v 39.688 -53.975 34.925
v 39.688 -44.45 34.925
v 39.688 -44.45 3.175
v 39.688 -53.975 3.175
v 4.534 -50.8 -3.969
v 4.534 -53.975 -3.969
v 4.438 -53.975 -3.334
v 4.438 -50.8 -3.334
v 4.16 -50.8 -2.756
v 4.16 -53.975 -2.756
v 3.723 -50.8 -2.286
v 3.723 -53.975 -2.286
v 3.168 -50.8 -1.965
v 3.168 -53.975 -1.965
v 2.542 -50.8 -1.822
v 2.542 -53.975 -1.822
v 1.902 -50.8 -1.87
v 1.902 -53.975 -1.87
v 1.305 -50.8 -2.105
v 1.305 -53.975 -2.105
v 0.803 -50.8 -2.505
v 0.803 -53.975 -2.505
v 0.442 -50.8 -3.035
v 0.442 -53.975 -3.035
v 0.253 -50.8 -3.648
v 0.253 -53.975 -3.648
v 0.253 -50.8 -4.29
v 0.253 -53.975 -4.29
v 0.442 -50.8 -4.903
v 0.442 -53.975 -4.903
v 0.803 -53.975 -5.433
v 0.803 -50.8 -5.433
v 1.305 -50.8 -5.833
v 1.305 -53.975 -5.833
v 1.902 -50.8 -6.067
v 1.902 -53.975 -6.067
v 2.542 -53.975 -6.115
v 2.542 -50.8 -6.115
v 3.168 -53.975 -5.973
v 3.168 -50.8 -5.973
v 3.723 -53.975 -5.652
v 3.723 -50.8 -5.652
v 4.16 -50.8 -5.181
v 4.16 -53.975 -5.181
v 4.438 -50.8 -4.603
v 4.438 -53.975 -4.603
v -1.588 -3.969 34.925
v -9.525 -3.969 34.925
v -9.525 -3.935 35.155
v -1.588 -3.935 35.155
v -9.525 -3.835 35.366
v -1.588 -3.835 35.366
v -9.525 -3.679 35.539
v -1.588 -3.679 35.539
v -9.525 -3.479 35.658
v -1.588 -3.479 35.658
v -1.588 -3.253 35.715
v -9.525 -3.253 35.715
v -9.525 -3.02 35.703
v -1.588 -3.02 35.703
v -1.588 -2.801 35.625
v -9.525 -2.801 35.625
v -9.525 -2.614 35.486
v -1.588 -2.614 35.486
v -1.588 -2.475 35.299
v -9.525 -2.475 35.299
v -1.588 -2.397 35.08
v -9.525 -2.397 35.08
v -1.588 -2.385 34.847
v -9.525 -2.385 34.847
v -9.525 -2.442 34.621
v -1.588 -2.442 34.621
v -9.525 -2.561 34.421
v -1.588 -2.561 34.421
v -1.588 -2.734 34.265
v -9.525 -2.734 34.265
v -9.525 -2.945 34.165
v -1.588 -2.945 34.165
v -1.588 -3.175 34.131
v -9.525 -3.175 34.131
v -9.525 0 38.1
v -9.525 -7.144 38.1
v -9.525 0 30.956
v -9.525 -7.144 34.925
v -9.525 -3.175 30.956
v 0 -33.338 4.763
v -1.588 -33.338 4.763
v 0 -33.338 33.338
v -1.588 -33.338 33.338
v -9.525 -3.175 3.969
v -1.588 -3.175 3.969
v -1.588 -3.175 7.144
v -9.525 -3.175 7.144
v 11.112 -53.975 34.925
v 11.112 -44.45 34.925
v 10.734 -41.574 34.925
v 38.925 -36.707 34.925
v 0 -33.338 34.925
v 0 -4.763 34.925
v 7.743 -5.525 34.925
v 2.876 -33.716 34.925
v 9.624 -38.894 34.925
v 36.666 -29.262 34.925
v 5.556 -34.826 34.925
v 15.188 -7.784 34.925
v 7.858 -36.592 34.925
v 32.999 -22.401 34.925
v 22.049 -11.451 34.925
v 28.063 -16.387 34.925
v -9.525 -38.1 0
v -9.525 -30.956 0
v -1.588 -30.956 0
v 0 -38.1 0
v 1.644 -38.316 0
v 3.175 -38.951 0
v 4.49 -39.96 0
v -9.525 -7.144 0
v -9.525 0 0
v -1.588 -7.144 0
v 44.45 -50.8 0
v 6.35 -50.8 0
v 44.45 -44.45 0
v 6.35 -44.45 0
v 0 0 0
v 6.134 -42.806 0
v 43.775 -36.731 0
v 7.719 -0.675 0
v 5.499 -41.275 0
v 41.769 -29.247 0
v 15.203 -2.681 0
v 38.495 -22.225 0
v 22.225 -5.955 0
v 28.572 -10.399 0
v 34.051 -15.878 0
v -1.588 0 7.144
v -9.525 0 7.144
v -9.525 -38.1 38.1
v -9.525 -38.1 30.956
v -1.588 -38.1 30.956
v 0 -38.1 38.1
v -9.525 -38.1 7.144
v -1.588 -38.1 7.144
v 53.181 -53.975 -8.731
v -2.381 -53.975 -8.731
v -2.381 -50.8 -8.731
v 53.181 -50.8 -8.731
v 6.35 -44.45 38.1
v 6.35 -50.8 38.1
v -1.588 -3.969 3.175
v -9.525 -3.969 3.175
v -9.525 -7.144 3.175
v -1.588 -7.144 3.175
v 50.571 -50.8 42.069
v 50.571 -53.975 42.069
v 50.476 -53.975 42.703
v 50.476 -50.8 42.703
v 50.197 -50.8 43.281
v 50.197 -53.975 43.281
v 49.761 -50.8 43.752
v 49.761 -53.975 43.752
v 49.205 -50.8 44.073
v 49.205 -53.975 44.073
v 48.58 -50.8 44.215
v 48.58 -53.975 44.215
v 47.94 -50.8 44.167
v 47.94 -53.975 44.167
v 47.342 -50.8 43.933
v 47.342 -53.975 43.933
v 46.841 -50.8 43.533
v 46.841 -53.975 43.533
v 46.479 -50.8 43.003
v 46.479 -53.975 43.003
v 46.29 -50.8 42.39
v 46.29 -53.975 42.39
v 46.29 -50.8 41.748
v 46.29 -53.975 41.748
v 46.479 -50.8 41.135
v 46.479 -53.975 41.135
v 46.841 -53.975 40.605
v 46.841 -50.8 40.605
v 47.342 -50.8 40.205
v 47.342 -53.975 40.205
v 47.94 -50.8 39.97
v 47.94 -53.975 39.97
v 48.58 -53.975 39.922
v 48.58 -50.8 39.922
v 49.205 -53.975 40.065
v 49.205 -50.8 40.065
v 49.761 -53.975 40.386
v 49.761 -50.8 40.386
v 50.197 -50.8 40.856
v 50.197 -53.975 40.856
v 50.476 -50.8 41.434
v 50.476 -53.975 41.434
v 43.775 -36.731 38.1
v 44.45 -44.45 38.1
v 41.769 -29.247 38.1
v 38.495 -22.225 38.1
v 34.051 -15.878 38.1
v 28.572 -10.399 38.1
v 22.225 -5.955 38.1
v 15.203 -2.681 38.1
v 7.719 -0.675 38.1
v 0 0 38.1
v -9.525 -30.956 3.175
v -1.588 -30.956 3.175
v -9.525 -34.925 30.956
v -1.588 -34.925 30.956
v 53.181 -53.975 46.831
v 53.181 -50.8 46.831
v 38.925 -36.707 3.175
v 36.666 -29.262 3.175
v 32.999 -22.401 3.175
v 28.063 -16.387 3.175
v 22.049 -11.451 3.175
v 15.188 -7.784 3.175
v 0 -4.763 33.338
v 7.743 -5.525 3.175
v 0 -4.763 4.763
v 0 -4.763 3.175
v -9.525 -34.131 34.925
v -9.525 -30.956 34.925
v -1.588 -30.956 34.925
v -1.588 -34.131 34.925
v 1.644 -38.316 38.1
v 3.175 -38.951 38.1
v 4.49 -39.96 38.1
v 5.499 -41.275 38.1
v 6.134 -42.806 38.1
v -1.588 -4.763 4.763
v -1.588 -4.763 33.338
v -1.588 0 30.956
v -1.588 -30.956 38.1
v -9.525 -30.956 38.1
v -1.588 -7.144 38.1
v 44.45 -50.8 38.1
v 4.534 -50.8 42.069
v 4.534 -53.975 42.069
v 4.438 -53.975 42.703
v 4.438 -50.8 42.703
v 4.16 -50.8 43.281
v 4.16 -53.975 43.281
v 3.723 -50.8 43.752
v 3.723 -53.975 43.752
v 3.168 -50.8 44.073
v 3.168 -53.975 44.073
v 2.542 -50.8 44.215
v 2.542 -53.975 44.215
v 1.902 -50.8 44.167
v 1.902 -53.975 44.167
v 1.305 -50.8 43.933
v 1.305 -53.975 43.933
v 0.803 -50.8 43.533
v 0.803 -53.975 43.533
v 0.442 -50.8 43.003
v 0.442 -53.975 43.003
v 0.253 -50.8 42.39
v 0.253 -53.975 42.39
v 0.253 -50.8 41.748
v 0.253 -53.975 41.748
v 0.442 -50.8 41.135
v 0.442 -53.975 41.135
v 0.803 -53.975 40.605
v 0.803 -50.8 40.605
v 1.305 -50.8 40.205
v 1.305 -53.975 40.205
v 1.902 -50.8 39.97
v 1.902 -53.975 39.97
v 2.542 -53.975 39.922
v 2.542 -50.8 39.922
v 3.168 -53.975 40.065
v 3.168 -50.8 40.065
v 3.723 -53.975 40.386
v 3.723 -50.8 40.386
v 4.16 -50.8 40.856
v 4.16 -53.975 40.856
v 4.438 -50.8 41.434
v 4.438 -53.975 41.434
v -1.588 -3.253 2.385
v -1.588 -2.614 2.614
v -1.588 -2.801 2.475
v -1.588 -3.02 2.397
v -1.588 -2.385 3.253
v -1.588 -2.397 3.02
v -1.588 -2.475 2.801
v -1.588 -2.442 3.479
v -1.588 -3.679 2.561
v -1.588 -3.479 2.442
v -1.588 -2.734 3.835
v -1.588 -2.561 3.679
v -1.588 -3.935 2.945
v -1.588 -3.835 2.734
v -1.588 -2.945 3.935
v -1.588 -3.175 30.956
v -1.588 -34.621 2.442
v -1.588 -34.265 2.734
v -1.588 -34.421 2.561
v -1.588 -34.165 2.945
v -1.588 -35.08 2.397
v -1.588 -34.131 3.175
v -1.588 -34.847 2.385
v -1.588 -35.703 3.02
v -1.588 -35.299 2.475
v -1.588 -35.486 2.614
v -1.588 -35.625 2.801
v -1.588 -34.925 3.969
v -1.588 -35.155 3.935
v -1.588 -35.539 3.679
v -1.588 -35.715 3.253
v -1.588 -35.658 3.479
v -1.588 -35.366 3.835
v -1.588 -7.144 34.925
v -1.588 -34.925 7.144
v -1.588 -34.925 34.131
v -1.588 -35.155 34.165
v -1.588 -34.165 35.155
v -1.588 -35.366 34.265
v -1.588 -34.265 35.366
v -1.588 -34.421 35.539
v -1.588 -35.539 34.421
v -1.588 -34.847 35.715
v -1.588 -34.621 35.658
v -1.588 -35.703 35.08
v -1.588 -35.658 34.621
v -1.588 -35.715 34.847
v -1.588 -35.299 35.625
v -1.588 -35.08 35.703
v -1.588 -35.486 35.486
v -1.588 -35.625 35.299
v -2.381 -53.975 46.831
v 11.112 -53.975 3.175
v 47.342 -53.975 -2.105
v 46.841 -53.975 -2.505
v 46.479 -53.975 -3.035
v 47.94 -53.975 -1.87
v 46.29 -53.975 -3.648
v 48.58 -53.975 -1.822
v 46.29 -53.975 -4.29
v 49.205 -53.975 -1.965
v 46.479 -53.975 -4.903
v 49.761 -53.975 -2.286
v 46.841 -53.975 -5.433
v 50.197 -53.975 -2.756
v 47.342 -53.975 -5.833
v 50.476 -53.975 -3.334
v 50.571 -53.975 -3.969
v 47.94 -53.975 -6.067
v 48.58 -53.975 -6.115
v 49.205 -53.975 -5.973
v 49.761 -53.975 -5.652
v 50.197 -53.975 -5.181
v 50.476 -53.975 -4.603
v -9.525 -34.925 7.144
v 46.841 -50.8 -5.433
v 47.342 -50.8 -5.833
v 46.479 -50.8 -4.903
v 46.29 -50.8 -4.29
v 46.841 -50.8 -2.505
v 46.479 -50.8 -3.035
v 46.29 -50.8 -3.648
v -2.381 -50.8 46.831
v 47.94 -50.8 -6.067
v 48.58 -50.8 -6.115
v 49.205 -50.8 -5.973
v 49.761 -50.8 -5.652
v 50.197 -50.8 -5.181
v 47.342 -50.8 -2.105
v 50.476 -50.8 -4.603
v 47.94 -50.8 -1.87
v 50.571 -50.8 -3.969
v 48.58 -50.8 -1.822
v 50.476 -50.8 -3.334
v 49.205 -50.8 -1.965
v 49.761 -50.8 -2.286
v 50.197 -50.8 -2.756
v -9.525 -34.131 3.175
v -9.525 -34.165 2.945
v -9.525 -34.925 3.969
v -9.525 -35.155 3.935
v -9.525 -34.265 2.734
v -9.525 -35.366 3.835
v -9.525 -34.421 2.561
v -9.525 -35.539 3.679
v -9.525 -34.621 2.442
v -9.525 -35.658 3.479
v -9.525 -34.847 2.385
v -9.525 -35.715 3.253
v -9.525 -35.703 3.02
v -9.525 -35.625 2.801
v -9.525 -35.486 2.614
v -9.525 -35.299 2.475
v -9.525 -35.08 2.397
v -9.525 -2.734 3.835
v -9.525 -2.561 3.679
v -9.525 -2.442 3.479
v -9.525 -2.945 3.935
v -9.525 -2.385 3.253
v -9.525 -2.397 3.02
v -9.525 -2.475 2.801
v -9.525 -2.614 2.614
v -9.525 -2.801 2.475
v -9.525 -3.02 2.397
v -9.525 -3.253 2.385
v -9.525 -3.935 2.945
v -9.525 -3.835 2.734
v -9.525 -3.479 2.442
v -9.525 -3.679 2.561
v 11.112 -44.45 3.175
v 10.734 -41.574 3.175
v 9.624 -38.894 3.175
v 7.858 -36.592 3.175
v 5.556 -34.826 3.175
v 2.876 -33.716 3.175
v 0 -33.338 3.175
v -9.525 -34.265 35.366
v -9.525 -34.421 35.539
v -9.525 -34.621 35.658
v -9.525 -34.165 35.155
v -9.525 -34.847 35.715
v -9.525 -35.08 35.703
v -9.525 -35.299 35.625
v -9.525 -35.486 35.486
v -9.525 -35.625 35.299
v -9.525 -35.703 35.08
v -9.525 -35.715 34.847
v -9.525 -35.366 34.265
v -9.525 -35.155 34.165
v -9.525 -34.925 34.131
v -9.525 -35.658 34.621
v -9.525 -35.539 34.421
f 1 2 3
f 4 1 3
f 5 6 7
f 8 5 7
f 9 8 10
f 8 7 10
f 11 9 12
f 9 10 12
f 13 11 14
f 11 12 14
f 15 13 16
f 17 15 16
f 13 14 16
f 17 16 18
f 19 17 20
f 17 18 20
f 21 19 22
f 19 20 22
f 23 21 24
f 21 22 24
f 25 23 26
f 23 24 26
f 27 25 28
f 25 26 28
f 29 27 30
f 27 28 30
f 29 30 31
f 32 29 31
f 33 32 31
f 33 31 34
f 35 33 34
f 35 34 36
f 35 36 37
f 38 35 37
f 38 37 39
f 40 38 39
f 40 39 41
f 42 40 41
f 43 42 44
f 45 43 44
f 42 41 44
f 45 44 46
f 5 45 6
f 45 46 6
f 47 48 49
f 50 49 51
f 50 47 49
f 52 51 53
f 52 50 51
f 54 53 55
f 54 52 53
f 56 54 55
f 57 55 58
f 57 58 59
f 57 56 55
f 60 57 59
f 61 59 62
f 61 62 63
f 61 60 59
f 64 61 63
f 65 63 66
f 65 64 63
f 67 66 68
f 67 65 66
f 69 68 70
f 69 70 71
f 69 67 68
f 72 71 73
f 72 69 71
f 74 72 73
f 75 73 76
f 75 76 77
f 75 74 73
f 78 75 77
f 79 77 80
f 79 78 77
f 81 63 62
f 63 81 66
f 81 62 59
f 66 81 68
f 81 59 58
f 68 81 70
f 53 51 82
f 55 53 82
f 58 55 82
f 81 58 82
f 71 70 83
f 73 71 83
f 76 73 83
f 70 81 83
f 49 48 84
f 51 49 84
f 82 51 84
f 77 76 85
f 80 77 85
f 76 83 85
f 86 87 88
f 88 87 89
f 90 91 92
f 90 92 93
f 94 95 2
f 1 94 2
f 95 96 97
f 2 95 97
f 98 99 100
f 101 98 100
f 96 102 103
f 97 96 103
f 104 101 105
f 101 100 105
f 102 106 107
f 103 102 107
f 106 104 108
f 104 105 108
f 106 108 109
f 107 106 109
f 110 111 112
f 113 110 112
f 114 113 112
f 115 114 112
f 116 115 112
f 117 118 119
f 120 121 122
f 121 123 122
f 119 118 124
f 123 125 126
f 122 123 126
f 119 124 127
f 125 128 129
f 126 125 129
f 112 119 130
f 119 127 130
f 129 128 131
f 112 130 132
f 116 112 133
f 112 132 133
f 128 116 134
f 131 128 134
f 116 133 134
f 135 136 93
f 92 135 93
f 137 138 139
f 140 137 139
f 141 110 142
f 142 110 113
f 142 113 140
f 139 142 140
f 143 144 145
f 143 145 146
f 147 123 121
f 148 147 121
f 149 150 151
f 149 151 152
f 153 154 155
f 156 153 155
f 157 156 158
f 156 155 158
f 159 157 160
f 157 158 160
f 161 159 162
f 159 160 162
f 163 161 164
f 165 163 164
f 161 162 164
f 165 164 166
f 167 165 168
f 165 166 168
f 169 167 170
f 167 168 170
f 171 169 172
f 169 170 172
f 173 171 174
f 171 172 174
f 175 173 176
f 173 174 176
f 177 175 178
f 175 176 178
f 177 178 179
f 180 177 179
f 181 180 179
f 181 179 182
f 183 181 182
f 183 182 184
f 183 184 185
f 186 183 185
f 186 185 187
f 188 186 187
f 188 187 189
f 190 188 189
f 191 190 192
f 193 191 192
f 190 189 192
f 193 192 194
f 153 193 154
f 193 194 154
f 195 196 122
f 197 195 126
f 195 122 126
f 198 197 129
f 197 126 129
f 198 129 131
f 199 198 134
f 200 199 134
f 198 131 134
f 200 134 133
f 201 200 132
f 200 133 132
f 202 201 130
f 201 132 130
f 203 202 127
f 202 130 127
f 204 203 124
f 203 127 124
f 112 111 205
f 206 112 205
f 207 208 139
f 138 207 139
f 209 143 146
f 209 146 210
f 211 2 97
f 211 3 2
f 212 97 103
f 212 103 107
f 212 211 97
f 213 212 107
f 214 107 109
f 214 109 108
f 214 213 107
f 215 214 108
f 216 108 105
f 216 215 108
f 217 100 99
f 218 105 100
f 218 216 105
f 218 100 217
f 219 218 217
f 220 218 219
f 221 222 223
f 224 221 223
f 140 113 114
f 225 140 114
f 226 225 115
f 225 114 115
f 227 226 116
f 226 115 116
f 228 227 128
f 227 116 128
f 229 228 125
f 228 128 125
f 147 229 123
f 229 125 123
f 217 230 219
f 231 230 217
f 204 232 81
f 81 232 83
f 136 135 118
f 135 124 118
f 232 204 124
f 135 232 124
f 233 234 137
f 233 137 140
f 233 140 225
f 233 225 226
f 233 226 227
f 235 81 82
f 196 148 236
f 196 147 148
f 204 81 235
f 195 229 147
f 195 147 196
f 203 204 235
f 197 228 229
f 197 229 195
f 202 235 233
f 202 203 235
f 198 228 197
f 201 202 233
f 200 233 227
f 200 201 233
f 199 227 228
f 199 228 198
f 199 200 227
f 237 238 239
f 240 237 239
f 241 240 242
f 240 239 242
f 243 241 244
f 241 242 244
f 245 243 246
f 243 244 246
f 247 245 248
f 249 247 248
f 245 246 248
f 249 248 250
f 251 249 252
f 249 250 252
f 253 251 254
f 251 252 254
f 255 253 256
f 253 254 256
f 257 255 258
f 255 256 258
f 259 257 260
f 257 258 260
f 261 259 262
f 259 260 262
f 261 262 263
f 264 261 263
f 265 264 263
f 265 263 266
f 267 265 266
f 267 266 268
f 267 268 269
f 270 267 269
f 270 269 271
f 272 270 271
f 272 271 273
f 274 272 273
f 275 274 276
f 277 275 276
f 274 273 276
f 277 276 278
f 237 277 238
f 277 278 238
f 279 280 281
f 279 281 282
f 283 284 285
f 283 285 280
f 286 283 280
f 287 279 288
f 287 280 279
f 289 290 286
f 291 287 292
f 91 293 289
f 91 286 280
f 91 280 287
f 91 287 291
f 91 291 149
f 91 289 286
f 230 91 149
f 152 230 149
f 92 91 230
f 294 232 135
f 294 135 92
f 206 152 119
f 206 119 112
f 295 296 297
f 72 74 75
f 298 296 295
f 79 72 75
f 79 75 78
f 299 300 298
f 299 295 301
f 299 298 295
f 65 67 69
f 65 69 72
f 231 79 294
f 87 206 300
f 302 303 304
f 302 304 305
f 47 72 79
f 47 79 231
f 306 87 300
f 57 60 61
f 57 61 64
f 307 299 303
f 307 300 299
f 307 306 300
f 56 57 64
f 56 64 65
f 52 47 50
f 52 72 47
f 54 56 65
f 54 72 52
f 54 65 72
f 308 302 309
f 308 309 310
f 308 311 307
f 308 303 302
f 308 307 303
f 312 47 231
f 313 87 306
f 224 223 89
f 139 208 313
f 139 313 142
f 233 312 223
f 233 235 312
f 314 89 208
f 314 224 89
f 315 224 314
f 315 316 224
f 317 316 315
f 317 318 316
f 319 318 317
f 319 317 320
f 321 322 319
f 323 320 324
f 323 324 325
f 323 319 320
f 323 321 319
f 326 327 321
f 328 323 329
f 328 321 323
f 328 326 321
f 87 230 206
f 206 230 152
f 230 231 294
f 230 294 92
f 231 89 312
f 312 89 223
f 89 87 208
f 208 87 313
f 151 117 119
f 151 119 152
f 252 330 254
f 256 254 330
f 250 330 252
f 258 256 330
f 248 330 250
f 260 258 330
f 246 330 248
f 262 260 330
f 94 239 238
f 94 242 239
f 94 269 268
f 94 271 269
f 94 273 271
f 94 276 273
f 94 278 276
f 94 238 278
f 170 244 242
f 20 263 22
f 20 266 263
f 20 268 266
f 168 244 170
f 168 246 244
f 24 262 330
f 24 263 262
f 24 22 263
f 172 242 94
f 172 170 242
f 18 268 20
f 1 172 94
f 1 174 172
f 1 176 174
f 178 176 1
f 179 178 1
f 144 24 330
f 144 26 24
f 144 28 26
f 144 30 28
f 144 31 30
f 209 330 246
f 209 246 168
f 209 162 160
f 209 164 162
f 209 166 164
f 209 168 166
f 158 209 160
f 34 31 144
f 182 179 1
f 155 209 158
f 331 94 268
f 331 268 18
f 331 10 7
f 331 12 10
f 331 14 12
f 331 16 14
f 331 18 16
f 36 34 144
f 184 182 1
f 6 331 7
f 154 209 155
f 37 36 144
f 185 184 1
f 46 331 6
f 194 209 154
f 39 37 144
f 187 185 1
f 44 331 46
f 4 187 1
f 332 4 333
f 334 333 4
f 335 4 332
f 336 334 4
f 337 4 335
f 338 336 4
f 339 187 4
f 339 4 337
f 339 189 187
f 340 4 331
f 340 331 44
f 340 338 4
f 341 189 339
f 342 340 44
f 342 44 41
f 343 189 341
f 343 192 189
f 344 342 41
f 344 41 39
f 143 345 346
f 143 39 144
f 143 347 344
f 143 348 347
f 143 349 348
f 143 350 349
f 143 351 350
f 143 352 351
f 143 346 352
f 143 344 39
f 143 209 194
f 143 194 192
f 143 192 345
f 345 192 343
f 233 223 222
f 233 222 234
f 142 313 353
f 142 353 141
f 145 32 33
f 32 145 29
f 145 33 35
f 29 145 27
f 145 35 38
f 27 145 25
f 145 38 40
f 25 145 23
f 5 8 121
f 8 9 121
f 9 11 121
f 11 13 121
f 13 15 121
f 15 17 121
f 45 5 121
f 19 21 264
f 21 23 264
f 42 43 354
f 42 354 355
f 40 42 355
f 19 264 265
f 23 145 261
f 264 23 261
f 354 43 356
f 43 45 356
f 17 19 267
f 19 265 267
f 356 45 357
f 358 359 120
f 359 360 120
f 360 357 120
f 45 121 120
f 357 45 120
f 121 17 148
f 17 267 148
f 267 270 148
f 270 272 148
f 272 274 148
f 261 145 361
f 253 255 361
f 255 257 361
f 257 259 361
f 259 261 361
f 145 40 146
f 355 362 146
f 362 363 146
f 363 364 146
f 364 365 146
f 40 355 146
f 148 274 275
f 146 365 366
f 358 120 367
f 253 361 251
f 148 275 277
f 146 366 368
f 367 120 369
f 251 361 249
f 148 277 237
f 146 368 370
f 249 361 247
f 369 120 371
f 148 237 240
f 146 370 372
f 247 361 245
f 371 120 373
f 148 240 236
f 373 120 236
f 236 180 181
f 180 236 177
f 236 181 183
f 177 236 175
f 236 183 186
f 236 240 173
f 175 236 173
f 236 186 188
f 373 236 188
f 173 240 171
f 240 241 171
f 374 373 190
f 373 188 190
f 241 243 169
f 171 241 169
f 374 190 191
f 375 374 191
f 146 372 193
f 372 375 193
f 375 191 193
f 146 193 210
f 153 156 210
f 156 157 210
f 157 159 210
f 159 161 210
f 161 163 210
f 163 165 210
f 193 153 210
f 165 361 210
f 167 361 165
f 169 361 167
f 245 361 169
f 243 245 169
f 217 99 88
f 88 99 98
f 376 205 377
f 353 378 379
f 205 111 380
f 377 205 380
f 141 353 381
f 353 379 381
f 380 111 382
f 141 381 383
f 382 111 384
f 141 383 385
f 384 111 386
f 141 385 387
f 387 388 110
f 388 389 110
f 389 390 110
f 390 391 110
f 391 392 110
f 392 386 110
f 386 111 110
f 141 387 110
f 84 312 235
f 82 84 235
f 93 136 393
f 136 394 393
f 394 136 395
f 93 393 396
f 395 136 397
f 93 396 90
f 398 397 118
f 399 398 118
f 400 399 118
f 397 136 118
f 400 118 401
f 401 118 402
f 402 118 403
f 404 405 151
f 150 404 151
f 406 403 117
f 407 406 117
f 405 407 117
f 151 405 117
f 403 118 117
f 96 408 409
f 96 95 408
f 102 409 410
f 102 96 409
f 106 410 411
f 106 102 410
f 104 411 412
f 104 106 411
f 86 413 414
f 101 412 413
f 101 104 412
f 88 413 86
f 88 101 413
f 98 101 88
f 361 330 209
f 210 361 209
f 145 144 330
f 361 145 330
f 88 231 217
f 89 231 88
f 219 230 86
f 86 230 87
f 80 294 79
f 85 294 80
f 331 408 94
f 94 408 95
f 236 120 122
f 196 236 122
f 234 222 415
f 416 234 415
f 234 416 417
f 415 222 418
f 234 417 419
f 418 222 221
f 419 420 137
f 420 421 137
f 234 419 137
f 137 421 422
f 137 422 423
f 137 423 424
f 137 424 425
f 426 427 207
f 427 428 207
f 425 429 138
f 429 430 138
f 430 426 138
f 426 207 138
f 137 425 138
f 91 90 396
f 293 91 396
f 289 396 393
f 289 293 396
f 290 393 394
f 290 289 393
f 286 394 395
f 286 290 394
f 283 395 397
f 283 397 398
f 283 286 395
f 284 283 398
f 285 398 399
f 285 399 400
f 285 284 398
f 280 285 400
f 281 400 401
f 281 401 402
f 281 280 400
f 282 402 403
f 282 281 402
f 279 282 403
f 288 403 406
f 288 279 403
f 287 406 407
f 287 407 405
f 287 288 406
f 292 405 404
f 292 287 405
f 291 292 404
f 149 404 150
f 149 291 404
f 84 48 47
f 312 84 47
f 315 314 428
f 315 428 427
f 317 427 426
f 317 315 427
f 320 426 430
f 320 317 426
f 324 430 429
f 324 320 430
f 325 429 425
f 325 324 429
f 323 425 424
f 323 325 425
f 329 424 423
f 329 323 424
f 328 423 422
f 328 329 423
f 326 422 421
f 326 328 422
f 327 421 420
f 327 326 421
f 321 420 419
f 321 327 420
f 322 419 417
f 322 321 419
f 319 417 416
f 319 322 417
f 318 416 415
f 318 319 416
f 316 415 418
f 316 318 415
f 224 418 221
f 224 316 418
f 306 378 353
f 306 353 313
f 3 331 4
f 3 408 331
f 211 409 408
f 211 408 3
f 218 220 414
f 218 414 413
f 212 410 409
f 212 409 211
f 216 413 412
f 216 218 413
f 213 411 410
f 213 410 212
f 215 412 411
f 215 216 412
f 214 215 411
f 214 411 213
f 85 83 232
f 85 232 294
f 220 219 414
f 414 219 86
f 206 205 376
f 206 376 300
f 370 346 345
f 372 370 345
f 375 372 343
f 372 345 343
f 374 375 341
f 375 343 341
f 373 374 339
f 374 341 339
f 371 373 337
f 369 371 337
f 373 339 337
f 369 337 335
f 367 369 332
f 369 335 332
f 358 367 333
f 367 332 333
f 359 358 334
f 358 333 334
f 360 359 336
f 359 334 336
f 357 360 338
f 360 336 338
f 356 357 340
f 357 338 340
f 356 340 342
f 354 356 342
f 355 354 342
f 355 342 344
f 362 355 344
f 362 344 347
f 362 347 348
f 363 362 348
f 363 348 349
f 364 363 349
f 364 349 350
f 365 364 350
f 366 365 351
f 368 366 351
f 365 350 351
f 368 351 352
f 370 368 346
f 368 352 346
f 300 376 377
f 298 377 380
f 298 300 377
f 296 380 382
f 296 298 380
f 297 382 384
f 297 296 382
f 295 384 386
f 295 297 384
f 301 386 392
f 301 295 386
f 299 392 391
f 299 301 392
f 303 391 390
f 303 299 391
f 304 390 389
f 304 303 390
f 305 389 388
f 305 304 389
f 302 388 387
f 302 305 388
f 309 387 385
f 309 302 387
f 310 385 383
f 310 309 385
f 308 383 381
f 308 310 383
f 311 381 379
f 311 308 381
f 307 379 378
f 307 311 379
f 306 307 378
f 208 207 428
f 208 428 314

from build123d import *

# Parameters (mm, degrees)
F1_DEPTH  = 38.1
F2_T      = -3.175
F3_DEPTH  = 3.175
F4_W      = 3.175
F4_H      = 23.8125
F4_W_2    = 23.8125
F4_H_2    = 3.175
F5_DEPTH  = 7.9375
F6_W      = 55.5625
F6_H      = 55.5625
F6_R      = 2.15265
F6_W_2    = 31.75
F6_H_2    = 31.75
F7_DEPTH  = 3.175
F8_W      = 31.75
F8_H      = 31.75
F8_W_2    = 28.575
F8_H_2    = 28.575
F9_DEPTH  = 1.5875
F10_R     = 0.79375
F11_DEPTH = 7.9375
F12_W     = 1.5875
F12_H     = 31.75
F14_W     = 1.5875
F14_H     = 31.75


with BuildPart() as f1:
    # F0 (on Top) → F1 (new body)
    with BuildSketch(Plane.XY):
        with BuildLine():
            ThreePointArc((44.45, -44.45), (31.4308964237, -13.0191035763), (0, 0))
            Line((0, 0), (-9.525, 0))
            Line((-9.525, 0), (-9.525, -38.1))
            Line((-9.525, -38.1), (0, -38.1))
            ThreePointArc((0, -38.1), (4.4901280605, -39.9598719395), (6.35, -44.45))
            Line((6.35, -44.45), (6.35, -53.975))
            Line((6.35, -53.975), (44.45, -53.975))
            Line((44.45, -53.975), (44.45, -44.45))
        make_face()
    extrude(amount=F1_DEPTH)

    # F2
    f2_openings = [f1.faces().sort_by_distance(p)[0] for p in [
        (-9.525, -19.05, 19.05),
    ]]
    offset(amount=F2_T, openings=f2_openings)

    # F3 (cut, through all): a face of the model
    f3_faces = [f1.faces().sort_by_distance(p)[0] for p in [
        (25.4, -50.8, 19.05),
    ]]
    extrude(f3_faces, amount=-F3_DEPTH, mode=Mode.SUBTRACT)

    # F4 (on face) → F5 (cut)
    with BuildSketch(Plane(origin=(-9.525, 0, 0), x_dir=(0, -1, 0), z_dir=(-1, 0, 0))):
        with Locations((1.5875, 19.05)):
            Rectangle(F4_W, F4_H)
        with Locations((19.05, 36.5125)):
            Rectangle(F4_W_2, F4_H_2)
        with Locations((36.5125, 19.05)):
            Rectangle(F4_W, F4_H)
        with Locations((19.05, 1.5875)):
            Rectangle(F4_W_2, F4_H_2)
    extrude(amount=-F5_DEPTH, mode=Mode.SUBTRACT)

    # F6 (on face) → F7 (join)
    with BuildSketch(Plane.XZ.offset(53.975)):
        with Locations((25.4, 19.05)):
            Rectangle(F6_W, F6_H)
        with Locations((2.38125, -3.96875)):
            Circle(F6_R, mode=Mode.SUBTRACT)
        with Locations((48.41875, -3.96875)):
            Circle(F6_R, mode=Mode.SUBTRACT)
        with Locations((2.38125, 42.06875)):
            Circle(F6_R, mode=Mode.SUBTRACT)
        with Locations((25.4, 19.05)):
            Rectangle(F6_W_2, F6_H_2, mode=Mode.SUBTRACT)
        with Locations((48.41875, 42.06875)):
            Circle(F6_R, mode=Mode.SUBTRACT)
    extrude(amount=-F7_DEPTH)

    # F8 (on face) → F9 (join)
    with BuildSketch(Plane(origin=(-1.5875, 0, 0), x_dir=(0, -1, 0), z_dir=(-1, 0, 0))):
        with Locations((19.05, 19.05)):
            Rectangle(F8_W, F8_H)
        with Locations((19.05, 19.05)):
            Rectangle(F8_W_2, F8_H_2, mode=Mode.SUBTRACT)
    extrude(amount=-F9_DEPTH)

    # F10 (on face) → F11 (cut, through all)
    with BuildSketch(Plane(origin=(-1.5875, 0, 0), x_dir=(0, -1, 0), z_dir=(-1, 0, 0))):
        with Locations((3.175, 34.925)):
            Circle(F10_R)
        with Locations((3.175, 3.175)):
            Circle(F10_R)
        with Locations((34.925, 34.925)):
            Circle(F10_R)
        with Locations((34.925, 3.175)):
            Circle(F10_R)
    extrude(amount=F11_DEPTH, mode=Mode.SUBTRACT)

    # F13: sweep along a path in F13_path
    with BuildLine(Plane(origin=(9.525, -53.975, 34.925), x_dir=(0, -1, 0), z_dir=(0, 0, -1))) as f13_path:
        Line((0, 0), (-9.525, 0))
        ThreePointArc((-9.525, 0), (-16.2601920908, 2.7898079092), (-19.05, 9.525))
    # F12 (on face) → F13 (sweep)
    with BuildSketch(Plane.XZ.offset(53.975)):
        with Locations((10.31875, 19.05)):
            Rectangle(F12_W, F12_H)
    sweep(path=f13_path.line)

    # F15: sweep along a path in F15_path
    with BuildLine(Plane(origin=(41.275, -53.975, 34.925), x_dir=(0, -1, 0), z_dir=(0, 0, -1))) as f15_path:
        Line((0, 0), (-9.525, 0))
        ThreePointArc((-9.525, 0), (-38.7108323935, 12.0891676065), (-50.8, 41.275))
    # F14 (on face) → F15 (sweep)
    with BuildSketch(Plane.XZ.offset(53.975)):
        with Locations((40.48125, 19.05)):
            Rectangle(F14_W, F14_H)
    sweep(path=f15_path.line)


solid = f1.part
